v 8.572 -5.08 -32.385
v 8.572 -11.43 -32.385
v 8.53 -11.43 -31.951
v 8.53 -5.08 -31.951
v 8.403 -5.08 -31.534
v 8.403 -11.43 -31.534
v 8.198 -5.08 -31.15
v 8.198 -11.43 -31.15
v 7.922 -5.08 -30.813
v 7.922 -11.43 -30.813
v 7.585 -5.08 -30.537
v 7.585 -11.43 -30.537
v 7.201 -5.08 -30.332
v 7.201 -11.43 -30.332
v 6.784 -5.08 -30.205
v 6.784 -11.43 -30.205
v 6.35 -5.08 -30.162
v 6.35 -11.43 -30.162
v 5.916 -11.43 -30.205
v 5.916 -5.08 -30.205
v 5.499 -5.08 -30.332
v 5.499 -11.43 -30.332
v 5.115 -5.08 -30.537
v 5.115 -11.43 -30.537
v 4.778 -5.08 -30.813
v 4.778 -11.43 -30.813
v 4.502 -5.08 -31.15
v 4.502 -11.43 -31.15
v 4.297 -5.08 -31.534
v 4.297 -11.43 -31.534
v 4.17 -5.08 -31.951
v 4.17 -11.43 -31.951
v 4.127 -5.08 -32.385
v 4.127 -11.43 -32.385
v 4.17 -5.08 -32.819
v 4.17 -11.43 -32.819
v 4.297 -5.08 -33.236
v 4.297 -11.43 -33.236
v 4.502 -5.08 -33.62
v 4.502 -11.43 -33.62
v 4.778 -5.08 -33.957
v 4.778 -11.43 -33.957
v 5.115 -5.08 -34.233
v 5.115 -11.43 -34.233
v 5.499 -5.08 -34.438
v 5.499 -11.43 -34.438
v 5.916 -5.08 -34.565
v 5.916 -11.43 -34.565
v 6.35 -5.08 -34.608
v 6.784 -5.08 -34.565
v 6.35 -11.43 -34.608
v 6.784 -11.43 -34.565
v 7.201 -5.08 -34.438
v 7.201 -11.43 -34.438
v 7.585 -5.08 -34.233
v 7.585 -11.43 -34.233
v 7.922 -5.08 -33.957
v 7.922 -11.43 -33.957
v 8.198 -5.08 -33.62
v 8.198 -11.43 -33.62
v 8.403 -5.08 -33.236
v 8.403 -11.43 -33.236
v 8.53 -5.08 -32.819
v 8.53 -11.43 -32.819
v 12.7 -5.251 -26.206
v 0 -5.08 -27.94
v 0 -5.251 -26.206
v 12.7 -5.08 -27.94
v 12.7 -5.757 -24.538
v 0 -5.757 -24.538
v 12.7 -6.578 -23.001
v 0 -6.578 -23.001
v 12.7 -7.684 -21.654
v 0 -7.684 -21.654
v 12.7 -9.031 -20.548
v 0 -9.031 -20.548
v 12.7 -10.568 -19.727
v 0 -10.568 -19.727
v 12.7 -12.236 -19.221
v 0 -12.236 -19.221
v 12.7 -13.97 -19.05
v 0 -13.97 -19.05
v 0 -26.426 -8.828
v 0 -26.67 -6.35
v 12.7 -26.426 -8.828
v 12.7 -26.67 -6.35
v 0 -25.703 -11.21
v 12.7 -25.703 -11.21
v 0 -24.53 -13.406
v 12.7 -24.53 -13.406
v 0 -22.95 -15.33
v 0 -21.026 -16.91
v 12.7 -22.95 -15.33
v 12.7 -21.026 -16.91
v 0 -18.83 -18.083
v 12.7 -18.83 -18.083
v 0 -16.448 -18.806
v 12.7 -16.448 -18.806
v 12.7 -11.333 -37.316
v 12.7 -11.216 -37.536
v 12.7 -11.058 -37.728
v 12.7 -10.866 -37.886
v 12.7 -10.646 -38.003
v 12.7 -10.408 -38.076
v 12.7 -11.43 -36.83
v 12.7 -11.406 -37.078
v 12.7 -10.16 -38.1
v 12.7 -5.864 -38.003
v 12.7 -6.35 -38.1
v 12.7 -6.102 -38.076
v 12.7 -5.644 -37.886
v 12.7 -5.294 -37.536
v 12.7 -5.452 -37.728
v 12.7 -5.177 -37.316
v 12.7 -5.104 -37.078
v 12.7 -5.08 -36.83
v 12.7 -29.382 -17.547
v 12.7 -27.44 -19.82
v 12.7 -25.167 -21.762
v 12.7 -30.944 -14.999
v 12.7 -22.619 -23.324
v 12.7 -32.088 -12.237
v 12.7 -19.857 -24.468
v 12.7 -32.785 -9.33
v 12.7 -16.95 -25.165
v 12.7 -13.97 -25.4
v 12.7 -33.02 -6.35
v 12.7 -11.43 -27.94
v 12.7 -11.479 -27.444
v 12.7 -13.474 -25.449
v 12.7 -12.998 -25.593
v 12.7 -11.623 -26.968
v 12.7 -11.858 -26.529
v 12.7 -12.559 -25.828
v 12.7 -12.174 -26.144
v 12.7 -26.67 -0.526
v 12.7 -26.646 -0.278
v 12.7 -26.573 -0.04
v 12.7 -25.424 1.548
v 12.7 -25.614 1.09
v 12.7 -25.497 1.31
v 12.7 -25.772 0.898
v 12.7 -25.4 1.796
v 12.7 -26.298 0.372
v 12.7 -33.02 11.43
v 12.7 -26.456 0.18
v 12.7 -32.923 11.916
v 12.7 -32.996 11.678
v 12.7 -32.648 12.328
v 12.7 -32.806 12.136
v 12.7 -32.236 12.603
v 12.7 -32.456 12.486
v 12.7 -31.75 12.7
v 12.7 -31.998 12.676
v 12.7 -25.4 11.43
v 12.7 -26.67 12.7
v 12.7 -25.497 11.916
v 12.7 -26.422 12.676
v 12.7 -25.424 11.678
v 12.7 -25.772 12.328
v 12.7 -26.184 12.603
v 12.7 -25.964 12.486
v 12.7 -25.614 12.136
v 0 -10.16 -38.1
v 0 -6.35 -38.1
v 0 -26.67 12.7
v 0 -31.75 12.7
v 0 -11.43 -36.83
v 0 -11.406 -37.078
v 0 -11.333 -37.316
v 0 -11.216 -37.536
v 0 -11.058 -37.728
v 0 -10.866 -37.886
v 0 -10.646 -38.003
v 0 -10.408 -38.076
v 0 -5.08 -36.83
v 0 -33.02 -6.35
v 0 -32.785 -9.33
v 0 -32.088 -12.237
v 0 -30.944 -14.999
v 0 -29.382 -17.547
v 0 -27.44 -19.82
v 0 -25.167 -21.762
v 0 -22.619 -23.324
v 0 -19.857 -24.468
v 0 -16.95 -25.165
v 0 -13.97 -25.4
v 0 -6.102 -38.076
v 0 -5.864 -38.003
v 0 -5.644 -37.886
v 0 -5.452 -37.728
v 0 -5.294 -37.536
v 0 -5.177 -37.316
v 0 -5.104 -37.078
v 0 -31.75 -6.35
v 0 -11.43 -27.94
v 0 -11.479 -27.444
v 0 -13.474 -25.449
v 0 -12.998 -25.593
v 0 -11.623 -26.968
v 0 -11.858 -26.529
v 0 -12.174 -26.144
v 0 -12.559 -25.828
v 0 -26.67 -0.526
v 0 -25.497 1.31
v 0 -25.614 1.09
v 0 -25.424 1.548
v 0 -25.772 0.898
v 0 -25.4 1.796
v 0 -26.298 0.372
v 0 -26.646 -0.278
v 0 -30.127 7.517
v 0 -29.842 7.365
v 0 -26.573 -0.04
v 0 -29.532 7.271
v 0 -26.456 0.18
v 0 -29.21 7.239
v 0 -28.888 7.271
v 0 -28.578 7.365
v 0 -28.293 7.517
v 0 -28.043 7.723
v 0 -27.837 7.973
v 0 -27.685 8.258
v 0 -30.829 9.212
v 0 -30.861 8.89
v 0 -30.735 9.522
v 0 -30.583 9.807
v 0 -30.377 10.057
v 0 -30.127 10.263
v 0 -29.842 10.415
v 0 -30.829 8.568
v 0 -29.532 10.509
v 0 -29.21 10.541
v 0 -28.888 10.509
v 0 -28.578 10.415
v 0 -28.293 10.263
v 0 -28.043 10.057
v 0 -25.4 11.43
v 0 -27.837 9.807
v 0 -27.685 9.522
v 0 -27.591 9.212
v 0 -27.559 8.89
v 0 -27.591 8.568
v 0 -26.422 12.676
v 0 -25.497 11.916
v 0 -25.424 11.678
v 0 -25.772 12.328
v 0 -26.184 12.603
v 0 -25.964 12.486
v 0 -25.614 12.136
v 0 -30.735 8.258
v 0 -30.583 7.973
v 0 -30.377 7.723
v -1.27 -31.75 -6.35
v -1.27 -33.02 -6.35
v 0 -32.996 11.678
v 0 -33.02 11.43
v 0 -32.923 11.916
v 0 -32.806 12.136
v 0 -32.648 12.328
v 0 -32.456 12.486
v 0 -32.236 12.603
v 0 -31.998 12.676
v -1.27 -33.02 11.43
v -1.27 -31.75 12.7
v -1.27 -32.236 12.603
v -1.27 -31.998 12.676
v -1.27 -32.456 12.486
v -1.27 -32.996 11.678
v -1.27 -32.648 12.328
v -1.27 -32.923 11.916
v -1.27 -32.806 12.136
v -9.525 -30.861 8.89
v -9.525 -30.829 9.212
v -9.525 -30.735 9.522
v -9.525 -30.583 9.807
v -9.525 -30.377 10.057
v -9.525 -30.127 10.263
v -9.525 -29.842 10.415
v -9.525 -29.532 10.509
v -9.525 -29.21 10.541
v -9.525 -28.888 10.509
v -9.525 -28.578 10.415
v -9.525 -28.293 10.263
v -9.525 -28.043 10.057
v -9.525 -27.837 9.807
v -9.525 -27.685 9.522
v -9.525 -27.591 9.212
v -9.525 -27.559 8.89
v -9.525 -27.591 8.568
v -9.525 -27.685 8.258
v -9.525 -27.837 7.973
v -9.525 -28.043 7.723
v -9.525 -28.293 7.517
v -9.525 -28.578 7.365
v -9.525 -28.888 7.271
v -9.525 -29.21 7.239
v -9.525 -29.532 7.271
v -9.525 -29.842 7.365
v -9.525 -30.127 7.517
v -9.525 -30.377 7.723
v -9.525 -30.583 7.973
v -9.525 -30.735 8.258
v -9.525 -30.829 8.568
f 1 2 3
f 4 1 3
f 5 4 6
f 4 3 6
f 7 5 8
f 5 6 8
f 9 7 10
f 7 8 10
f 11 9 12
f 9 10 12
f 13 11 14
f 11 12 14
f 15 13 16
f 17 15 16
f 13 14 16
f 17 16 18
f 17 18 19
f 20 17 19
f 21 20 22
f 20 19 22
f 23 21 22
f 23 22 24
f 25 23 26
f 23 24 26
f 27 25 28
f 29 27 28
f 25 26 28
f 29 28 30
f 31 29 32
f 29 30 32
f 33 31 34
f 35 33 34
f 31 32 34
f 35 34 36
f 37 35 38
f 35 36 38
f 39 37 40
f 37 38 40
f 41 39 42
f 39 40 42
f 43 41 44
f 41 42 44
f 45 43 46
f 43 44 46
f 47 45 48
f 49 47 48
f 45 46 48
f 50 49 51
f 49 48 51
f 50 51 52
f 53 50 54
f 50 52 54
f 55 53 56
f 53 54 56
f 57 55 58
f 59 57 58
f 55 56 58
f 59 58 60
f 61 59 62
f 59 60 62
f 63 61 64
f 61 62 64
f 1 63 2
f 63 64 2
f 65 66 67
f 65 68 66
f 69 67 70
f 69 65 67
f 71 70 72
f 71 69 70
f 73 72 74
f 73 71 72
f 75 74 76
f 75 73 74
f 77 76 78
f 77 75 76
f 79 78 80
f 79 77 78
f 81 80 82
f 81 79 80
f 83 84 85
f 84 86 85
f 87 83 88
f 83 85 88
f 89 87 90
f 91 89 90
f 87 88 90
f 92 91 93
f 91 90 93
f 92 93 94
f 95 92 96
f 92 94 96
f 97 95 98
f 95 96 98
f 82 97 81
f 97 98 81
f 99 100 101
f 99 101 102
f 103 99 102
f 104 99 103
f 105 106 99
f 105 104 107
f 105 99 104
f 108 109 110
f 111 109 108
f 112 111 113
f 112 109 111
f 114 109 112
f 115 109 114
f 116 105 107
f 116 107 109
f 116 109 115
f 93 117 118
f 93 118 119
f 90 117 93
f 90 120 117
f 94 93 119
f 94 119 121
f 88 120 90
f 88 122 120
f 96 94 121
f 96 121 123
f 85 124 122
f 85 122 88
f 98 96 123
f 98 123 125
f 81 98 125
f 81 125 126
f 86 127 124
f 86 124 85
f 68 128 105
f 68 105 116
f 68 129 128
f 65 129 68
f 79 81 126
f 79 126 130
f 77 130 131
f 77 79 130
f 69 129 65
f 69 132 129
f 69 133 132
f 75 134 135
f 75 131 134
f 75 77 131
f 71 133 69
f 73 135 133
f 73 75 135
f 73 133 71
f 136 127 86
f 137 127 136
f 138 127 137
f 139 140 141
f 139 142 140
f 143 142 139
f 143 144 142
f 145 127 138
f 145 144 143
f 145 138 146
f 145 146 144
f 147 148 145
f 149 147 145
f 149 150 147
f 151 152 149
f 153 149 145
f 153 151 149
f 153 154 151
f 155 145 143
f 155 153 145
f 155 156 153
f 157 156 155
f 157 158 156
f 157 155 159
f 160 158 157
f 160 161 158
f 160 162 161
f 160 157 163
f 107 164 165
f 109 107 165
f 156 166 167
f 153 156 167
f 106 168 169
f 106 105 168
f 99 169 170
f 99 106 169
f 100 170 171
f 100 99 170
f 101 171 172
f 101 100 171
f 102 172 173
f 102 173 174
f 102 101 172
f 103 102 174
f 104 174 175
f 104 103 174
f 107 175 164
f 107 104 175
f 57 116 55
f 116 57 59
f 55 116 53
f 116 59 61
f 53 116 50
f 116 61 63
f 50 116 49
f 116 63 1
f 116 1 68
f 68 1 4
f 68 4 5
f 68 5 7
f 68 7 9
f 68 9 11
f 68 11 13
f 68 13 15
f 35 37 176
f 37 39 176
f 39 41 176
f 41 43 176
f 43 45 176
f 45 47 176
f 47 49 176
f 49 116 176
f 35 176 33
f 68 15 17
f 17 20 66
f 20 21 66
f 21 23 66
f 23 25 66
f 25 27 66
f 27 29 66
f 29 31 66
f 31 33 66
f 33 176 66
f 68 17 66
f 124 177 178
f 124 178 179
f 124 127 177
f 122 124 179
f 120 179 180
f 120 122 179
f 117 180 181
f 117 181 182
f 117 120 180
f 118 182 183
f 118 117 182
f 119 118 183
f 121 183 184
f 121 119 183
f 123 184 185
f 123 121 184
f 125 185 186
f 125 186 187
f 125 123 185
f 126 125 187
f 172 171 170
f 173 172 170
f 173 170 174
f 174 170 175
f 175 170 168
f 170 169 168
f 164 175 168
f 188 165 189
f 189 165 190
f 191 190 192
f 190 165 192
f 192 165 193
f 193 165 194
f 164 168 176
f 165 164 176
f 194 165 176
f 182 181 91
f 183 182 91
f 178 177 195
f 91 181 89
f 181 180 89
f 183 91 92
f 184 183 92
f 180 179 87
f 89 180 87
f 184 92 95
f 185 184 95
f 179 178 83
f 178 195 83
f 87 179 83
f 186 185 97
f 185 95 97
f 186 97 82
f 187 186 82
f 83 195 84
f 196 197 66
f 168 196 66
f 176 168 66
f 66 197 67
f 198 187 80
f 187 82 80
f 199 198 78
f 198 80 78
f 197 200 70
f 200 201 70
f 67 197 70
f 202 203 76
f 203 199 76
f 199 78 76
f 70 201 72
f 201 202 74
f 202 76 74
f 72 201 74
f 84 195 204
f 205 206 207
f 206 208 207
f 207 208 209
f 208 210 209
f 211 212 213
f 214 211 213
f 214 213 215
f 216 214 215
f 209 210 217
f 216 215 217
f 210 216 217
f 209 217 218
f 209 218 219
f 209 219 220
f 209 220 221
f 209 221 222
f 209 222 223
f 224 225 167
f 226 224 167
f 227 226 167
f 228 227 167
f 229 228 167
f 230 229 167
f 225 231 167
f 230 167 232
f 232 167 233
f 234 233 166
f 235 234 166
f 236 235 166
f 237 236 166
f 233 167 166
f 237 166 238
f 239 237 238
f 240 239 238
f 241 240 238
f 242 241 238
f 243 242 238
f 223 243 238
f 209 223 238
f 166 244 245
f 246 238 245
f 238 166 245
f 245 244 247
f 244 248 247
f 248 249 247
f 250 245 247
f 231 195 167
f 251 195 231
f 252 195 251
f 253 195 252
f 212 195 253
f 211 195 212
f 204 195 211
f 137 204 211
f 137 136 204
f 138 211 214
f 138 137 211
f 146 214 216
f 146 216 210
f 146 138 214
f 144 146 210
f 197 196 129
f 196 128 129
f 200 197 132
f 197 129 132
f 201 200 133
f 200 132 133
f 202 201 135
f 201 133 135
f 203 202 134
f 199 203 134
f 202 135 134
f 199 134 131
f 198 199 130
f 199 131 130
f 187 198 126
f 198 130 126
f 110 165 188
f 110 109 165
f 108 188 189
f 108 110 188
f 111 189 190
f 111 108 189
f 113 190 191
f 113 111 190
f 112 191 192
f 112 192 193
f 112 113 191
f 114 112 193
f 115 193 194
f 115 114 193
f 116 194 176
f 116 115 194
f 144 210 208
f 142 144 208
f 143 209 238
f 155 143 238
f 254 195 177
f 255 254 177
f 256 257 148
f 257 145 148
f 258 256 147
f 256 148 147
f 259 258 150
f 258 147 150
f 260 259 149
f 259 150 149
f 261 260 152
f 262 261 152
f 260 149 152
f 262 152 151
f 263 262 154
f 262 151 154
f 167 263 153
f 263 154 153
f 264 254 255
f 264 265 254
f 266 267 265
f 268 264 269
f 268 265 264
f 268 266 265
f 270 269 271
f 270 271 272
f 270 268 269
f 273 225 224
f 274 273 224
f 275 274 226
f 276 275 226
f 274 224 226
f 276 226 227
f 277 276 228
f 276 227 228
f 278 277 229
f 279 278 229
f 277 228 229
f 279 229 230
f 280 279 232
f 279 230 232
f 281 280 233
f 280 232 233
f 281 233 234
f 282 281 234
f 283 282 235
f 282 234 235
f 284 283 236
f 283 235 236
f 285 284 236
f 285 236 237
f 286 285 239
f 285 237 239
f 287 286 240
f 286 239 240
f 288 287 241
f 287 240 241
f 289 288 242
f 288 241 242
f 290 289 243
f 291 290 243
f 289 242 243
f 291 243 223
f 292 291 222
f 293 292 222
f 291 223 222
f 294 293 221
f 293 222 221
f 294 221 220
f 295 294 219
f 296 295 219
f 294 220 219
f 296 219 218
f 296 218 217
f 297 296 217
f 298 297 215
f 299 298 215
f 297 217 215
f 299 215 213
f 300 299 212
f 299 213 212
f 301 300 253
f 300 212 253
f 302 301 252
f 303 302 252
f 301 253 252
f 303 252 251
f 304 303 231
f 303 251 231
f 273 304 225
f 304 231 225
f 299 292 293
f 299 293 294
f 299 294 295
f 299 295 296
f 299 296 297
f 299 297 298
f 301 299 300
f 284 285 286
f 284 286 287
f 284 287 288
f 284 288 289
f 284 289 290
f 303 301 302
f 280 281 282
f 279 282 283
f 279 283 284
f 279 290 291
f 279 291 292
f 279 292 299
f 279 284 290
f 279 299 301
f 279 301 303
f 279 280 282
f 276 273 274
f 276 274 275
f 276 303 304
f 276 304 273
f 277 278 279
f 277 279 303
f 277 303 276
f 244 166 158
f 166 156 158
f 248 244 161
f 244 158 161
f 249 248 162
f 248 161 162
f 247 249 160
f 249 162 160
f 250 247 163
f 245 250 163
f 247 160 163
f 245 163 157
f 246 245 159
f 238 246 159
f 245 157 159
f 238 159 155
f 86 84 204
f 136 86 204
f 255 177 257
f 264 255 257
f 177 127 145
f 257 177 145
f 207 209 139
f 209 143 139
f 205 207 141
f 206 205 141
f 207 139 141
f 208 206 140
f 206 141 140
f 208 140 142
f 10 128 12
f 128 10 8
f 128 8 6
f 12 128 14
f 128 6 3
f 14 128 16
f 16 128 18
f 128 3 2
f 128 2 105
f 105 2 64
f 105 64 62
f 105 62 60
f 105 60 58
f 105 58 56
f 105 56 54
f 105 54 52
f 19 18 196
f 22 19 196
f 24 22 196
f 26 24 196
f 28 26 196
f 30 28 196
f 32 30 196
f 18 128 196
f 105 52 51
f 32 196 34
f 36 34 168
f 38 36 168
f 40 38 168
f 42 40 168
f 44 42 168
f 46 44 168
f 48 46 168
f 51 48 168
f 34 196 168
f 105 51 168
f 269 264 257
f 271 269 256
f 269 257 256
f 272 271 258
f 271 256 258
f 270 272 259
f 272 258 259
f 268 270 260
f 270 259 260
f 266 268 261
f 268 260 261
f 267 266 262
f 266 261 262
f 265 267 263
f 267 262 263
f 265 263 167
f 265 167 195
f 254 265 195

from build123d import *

# Parameters (mm, degrees)
F2_DEPTH  = 12.7
F3_R      = 12.7
F4_R      = 19.05
F5_R      = 8.88999
F6_R      = 2.53999
F7_R      = 1.27
F8_R      = 2.2225
F9_DEPTH  = 6.35
F10_R     = 1.651
F11_DEPTH = 9.525
F13_DEPTH = 1.27


# Not quite as in the source:
# - a fillet or chamfer is up to 0.001 mm smaller than in the source, because OpenCascade refuses the exact size


with BuildPart() as f2:
    # F1 (on Right) → F2 (new body)
    with BuildSketch(Plane.YZ):
        Polygon((-26.67, -19.05), (-26.67, 0), (-25.4, 1.27), (-25.4, 12.7), (-33.02, 12.7), (-33.02, -25.4), (-11.43, -25.4), (-11.43, -38.1), (-5.08, -38.1), (-5.08, -19.05), align=None)
    extrude(amount=F2_DEPTH)

    # F3
    f3_edges = [f2.edges().sort_by_distance(p)[0] for p in [
        (6.35, -26.67, -19.05),
    ]]
    fillet(f3_edges, radius=F3_R)

    # F4
    f4_edges = [f2.edges().sort_by_distance(p)[0] for p in [
        (6.35, -33.02, -25.4),
    ]]
    fillet(f4_edges, radius=F4_R)

    # F5 (radius 8.89 in the source; OpenCascade refuses exactly that, so slightly less here)
    f5_edges = [f2.edges().sort_by_distance(p)[0] for p in [
        (6.35, -5.08, -19.05),
    ]]
    fillet(f5_edges, radius=F5_R)

    # F6 (radius 2.54 in the source; OpenCascade refuses exactly that, so slightly less here)
    f6_edges = [f2.edges().sort_by_distance(p)[0] for p in [
        (6.35, -11.43, -25.4),
    ]]
    fillet(f6_edges, radius=F6_R)

    # F7
    f7_edges = [f2.edges().sort_by_distance(p)[0] for p in [
        (6.35, -26.67, 0),
        (6.35, -25.4, 1.27),
        (6.35, -25.4, 12.7),
        (6.35, -33.02, 12.7),
        (6.35, -11.43, -38.1),
        (6.35, -5.08, -38.1),
    ]]
    fillet(f7_edges, radius=F7_R)

    # F8 (on face) → F9 (cut)
    with BuildSketch(Plane.XZ.offset(11.43)):
        with Locations((6.35, -32.385)):
            Circle(F8_R)
    extrude(amount=-F9_DEPTH, mode=Mode.SUBTRACT)

    # F10 (on face) → F11 (join)
    with BuildSketch(Plane(origin=(0, 0, 0), x_dir=(0, -1, 0), z_dir=(-1, 0, 0))):
        with Locations((29.21, 8.89)):
            Circle(F10_R)
    extrude(amount=F11_DEPTH)

    # F12 (on face) → F13 (join)
    with BuildSketch(Plane(origin=(0, 0, 0), x_dir=(0, -1, 0), z_dir=(-1, 0, 0))):
        with BuildLine():
            Line((31.75, -6.35), (33.02, -6.35))
            Line((33.02, -6.35), (33.02, 11.43))
            ThreePointArc((33.02, 11.43), (32.6480256121, 12.3280256121), (31.75, 12.7))
            Line((31.75, 12.7), (31.75, -6.35))
        make_face()
    extrude(amount=F13_DEPTH)


solid = f2.part
